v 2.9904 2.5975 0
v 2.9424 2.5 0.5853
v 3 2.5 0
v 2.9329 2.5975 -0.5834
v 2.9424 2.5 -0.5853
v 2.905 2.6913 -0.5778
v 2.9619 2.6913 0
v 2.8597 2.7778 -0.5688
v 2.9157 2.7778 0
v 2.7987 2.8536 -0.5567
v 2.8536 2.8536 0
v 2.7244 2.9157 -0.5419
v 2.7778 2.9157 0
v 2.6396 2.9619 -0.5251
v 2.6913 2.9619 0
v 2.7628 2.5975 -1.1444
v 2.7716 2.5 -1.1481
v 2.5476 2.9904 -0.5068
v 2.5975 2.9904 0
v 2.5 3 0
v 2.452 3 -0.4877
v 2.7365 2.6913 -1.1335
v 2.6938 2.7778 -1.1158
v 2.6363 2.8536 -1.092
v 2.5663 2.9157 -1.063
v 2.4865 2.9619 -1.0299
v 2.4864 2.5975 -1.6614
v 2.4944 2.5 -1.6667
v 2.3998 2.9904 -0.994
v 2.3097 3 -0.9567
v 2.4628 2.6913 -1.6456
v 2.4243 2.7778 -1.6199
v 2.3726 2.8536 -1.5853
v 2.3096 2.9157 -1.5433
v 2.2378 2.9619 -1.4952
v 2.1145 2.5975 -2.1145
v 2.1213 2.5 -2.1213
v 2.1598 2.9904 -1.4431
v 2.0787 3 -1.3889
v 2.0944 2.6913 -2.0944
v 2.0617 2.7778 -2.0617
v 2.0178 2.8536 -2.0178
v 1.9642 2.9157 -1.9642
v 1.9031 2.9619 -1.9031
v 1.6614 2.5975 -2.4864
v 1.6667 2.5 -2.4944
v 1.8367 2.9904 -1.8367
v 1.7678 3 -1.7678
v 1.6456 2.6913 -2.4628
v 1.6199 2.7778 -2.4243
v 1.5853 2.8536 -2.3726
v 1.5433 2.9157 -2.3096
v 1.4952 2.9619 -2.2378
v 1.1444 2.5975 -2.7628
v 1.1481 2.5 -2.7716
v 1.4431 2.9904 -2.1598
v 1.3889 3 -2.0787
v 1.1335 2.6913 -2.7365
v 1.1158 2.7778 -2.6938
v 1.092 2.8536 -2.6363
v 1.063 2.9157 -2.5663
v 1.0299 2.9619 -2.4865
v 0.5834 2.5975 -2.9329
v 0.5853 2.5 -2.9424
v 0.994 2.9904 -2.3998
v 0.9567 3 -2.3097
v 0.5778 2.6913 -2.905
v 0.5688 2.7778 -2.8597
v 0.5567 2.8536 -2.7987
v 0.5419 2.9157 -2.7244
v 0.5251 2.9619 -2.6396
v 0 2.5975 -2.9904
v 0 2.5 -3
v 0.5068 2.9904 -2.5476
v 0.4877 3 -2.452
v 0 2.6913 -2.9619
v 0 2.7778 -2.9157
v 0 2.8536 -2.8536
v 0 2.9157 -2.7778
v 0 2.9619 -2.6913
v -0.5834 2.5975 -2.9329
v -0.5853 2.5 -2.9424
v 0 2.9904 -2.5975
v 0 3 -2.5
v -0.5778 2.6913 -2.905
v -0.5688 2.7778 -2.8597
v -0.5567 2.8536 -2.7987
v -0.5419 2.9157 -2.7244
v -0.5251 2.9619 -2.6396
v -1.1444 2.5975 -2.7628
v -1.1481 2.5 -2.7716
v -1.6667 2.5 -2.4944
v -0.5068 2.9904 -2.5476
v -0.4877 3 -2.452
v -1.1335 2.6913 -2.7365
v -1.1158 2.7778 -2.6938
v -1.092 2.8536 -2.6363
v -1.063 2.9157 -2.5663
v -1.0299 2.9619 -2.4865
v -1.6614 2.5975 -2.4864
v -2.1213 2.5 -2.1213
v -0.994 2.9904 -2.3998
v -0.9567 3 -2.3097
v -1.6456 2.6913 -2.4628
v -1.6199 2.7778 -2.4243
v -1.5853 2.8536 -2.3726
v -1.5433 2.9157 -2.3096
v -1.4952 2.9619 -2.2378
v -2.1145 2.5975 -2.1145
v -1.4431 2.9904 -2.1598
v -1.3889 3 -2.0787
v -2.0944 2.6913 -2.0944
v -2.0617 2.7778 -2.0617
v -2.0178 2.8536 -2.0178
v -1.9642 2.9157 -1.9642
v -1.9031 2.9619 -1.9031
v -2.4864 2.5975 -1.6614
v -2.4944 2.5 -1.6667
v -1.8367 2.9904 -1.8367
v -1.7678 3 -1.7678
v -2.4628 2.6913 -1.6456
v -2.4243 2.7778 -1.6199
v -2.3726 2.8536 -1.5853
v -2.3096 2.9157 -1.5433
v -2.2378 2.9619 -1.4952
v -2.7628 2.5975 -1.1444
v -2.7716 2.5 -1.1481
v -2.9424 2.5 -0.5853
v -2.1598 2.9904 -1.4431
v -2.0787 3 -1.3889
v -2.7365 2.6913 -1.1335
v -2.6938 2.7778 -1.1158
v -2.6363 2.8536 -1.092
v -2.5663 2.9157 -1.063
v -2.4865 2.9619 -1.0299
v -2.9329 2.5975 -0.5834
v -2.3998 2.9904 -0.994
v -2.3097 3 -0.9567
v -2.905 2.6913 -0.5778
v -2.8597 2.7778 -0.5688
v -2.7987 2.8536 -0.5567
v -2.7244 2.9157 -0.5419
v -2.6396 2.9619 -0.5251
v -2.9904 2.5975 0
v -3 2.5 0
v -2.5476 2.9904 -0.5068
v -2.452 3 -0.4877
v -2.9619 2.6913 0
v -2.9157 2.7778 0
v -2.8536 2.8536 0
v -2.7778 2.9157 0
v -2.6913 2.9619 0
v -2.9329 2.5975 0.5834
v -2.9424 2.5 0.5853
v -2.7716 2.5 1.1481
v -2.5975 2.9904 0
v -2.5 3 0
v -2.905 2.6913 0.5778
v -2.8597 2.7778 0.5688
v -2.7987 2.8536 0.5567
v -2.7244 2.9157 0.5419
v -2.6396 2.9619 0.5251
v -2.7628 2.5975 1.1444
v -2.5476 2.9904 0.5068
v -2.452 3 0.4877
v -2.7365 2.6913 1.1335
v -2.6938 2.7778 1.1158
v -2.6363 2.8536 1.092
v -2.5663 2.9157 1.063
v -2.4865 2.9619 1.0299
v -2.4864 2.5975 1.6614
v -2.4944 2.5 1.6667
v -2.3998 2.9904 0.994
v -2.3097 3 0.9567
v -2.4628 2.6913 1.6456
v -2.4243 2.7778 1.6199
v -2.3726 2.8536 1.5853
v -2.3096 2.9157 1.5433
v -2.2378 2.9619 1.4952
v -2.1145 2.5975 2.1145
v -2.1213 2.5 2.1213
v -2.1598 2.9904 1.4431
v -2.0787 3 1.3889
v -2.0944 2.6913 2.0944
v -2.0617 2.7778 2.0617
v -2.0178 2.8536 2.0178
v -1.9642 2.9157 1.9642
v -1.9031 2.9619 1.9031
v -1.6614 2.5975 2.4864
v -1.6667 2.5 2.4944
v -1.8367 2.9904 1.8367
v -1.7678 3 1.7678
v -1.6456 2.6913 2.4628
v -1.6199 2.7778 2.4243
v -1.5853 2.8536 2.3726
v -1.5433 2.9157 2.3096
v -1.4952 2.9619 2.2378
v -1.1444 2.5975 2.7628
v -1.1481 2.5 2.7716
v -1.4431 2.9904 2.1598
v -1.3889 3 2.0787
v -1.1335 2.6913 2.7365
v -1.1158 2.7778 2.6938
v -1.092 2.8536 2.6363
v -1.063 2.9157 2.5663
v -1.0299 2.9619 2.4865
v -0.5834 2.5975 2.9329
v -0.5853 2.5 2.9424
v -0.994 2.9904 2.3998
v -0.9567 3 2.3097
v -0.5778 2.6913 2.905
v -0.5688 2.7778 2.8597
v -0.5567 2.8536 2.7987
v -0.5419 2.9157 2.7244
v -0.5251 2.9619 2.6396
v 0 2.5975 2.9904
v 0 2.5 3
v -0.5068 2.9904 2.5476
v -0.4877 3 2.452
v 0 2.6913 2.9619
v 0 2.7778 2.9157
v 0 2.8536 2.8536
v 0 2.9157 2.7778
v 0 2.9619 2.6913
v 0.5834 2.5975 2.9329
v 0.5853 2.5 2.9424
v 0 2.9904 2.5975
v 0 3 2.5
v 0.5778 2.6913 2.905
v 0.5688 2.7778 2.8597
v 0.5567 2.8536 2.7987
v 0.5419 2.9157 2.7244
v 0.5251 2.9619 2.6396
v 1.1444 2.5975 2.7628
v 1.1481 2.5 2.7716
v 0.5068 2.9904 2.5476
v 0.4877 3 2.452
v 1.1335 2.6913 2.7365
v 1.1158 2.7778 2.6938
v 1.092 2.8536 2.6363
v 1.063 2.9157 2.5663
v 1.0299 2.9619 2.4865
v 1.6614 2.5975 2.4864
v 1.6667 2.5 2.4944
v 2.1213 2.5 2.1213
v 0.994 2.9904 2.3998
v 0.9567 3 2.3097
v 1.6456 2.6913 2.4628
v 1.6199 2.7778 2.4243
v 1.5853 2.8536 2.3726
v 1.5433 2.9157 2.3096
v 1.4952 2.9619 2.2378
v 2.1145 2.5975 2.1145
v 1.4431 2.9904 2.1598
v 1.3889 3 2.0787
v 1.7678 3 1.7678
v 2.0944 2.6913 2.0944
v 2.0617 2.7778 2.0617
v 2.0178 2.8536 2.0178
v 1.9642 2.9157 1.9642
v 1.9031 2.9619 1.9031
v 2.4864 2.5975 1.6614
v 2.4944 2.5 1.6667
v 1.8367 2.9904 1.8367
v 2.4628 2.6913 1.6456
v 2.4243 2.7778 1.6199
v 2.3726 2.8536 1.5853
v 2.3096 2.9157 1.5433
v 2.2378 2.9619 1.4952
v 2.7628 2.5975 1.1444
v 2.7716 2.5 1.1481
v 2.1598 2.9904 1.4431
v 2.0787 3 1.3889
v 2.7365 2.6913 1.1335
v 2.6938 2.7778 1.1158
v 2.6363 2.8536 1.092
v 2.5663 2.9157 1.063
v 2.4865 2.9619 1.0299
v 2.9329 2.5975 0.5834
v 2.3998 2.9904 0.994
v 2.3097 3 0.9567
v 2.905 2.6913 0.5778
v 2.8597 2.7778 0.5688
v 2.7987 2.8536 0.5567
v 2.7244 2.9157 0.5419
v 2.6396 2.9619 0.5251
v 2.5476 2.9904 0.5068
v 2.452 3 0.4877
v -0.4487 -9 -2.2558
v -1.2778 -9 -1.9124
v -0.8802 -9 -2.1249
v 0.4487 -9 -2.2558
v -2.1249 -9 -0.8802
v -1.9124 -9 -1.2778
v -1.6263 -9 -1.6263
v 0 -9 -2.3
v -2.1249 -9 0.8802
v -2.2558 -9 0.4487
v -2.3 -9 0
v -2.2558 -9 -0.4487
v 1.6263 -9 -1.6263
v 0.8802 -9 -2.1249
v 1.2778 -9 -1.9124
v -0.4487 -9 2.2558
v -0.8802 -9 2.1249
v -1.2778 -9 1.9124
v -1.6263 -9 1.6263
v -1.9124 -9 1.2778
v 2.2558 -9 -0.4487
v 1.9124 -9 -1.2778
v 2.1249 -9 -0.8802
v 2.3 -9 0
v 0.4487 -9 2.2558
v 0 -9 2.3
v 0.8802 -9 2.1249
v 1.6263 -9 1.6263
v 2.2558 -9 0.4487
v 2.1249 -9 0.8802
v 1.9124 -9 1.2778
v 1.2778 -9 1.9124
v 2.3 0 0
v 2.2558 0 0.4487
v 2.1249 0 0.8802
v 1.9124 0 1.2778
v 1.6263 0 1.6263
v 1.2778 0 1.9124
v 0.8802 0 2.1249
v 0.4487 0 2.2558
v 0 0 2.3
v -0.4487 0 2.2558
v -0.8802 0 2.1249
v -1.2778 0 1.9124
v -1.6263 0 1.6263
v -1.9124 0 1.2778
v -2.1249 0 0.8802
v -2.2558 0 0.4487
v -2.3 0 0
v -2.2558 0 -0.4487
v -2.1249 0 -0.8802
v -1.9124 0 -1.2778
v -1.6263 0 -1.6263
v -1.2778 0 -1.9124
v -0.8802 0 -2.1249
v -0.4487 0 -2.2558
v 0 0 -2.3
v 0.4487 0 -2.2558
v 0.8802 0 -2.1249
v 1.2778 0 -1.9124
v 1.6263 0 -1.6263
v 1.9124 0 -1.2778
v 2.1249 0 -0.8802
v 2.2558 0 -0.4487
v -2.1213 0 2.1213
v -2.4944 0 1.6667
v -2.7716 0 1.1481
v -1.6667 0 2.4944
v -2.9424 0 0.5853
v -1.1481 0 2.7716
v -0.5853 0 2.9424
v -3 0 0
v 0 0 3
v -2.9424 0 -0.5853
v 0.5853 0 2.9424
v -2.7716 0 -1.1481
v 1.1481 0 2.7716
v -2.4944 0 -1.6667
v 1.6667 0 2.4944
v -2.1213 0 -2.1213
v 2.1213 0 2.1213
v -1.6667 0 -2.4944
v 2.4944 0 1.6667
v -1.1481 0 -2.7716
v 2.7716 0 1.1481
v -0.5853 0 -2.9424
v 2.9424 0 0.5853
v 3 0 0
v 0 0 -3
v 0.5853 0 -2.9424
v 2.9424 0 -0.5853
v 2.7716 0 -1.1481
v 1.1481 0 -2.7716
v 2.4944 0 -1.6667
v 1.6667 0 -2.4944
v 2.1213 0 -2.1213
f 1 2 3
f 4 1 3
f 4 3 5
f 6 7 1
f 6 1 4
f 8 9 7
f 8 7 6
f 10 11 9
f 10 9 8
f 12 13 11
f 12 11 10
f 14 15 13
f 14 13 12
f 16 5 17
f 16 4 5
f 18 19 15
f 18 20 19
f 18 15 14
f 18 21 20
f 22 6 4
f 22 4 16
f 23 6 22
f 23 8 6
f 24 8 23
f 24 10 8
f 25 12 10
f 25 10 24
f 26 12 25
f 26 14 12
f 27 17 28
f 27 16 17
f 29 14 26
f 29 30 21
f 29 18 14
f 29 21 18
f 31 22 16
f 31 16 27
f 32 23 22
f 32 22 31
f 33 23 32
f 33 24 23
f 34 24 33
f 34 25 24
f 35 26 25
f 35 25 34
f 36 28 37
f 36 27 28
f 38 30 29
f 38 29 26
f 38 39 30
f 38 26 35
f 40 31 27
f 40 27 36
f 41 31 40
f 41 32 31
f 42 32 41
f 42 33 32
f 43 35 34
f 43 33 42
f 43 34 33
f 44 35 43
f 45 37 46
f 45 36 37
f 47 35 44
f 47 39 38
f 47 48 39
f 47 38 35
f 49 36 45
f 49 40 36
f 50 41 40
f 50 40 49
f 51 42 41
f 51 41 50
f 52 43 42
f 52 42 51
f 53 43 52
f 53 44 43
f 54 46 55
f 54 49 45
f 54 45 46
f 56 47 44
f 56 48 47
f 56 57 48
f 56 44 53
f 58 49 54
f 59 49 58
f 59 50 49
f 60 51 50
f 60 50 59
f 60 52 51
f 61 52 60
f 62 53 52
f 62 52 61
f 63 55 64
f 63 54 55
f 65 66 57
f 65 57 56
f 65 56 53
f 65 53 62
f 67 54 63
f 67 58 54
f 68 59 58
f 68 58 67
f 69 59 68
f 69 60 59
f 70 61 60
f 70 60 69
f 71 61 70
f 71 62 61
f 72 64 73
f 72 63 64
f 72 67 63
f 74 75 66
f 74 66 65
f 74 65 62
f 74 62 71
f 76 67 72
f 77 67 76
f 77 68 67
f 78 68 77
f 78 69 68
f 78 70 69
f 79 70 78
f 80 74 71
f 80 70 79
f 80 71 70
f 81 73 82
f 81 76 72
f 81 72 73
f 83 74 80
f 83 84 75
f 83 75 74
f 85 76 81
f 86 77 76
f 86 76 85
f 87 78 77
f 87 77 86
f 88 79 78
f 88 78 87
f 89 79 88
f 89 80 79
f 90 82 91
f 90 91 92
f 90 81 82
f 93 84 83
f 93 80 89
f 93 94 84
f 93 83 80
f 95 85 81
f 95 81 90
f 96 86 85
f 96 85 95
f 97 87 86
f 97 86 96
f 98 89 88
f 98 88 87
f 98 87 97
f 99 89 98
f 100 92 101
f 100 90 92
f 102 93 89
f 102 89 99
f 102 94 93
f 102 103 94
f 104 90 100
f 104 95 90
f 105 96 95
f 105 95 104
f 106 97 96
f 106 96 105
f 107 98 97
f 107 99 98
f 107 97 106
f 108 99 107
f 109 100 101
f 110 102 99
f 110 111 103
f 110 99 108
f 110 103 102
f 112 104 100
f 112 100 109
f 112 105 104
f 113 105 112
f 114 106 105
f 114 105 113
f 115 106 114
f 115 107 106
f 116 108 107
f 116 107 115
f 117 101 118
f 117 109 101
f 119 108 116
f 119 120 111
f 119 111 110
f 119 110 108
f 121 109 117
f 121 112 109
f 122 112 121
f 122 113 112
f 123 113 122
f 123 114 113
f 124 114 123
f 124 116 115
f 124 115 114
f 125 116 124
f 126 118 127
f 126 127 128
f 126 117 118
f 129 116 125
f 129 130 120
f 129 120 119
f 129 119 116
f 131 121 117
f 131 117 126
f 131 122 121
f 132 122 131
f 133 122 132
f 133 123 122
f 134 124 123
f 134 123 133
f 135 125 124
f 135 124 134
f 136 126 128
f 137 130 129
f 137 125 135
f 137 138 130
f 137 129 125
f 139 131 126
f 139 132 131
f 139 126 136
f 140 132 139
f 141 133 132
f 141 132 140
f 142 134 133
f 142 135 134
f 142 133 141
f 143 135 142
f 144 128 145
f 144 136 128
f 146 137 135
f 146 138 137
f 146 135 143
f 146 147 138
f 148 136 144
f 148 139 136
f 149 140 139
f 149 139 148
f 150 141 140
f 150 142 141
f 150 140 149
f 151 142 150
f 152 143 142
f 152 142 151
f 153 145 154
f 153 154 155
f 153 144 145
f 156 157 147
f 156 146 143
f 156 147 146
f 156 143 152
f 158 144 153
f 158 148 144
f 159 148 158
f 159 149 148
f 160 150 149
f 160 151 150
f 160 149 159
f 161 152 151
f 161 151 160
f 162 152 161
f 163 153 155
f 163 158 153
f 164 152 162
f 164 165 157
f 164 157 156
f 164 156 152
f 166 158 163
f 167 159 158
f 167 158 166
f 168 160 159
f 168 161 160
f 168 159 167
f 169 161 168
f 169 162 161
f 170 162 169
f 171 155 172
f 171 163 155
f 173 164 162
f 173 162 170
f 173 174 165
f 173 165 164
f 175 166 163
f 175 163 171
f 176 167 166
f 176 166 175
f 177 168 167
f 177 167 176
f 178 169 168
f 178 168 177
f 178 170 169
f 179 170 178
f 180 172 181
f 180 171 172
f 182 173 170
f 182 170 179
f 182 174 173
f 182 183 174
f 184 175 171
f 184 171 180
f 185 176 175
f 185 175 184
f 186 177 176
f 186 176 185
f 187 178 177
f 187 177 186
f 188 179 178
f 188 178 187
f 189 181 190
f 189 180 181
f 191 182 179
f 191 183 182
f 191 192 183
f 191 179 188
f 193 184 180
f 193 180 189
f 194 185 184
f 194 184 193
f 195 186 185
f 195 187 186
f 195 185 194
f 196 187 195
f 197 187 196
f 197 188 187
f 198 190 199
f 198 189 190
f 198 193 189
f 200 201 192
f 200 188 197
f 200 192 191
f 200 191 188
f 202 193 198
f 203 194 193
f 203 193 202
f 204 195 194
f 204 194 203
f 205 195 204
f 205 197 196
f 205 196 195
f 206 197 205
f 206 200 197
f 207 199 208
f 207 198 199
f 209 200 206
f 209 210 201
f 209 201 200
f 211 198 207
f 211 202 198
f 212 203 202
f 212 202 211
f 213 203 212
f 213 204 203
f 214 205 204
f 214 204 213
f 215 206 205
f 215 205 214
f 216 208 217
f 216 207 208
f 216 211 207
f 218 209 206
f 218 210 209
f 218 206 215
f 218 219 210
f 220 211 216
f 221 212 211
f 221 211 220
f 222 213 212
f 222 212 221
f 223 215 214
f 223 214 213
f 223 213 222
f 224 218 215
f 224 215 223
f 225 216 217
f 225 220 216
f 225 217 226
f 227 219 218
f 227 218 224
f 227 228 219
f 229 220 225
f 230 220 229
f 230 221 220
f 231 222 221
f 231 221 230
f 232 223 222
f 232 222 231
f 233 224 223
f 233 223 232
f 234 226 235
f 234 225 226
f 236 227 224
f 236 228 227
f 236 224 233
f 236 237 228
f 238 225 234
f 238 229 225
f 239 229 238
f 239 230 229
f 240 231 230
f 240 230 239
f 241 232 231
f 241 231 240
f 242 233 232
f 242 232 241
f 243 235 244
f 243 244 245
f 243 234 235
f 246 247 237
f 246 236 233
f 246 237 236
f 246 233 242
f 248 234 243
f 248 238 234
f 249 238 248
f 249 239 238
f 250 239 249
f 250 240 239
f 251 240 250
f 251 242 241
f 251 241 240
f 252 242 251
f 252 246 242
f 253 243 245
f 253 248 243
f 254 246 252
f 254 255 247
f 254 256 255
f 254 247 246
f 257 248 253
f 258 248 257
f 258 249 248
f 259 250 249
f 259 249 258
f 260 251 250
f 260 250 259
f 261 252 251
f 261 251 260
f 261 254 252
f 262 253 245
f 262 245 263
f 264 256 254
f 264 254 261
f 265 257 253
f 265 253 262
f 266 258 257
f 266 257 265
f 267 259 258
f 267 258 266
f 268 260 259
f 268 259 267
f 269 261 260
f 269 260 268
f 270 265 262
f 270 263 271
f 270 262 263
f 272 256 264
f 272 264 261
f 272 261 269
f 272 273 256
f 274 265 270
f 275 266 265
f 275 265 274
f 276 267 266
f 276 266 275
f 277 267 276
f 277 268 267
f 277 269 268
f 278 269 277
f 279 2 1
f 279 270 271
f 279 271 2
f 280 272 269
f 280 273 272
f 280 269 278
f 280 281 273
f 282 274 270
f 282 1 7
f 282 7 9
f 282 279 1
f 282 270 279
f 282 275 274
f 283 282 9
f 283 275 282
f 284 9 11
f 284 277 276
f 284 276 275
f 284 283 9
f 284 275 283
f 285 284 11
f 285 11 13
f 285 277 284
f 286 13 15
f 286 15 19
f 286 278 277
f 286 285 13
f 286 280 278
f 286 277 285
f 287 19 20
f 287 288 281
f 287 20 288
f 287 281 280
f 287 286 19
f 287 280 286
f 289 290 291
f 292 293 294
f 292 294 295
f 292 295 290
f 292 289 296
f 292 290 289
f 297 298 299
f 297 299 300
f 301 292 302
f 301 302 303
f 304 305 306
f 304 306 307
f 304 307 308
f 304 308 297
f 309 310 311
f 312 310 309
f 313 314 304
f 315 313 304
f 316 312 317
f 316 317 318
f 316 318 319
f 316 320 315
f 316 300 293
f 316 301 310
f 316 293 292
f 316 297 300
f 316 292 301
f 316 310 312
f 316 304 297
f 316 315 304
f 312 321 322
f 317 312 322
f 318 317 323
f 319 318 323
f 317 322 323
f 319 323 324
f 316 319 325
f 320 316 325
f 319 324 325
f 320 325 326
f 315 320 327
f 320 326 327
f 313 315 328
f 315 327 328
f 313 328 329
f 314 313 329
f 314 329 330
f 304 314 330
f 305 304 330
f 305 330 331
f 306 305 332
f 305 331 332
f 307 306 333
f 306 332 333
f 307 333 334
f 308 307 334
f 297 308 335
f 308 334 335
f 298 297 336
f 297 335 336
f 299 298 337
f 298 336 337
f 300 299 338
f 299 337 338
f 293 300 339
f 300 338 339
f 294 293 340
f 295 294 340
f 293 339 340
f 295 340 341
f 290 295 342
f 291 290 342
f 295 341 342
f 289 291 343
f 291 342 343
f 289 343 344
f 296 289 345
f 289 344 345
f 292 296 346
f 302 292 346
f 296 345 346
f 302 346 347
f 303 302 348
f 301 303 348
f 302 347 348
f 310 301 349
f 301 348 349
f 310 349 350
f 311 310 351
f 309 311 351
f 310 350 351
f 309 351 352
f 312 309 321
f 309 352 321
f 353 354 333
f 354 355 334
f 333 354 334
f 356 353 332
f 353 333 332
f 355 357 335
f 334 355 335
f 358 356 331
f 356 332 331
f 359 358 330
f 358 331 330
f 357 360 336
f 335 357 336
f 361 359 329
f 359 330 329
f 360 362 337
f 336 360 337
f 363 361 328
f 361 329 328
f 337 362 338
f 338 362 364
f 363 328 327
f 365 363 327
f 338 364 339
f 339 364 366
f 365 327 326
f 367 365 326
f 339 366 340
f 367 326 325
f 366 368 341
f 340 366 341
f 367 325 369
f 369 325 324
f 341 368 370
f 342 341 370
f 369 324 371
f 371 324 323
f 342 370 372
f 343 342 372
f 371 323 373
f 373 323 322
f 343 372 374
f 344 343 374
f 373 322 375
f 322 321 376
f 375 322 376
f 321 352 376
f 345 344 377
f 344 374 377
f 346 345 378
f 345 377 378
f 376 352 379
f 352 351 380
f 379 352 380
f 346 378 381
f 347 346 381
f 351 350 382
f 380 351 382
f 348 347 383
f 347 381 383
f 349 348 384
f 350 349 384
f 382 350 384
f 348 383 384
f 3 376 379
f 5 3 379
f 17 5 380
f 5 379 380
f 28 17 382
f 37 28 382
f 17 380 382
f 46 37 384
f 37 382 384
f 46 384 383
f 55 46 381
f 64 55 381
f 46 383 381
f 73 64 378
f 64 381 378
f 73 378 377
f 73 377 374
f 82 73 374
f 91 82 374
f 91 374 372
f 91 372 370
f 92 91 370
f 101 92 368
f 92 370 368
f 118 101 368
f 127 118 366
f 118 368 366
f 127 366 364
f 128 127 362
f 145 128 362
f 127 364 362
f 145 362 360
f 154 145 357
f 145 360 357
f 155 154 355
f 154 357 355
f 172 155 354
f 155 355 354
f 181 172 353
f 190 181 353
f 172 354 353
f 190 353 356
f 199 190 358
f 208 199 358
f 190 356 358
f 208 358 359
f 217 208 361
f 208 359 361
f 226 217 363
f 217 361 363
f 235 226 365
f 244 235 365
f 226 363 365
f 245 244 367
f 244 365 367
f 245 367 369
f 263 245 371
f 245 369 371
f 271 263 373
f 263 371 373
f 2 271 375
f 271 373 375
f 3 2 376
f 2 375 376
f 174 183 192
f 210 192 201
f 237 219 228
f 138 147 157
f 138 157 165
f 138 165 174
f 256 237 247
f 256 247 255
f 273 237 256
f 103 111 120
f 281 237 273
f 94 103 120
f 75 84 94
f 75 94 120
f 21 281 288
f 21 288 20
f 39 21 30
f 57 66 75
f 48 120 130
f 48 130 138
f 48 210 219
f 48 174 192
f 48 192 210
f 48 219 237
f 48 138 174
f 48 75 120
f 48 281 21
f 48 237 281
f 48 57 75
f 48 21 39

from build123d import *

# Parameters (mm, degrees)
SKETCH1_R           = 3
BOSS_EXTRUDE1_DEPTH = 3
FILLET1_R           = 0.5
SKETCH2_R           = 2.3
BOSS_EXTRUDE2_DEPTH = 9


with BuildPart() as part:
    # Sketch1 → Boss-Extrude1 (new body)
    with BuildSketch(Plane(origin=(0, 0, 0), x_dir=(1, 0, 0), z_dir=(0, 1, 0))):
        Circle(SKETCH1_R)
    extrude(amount=BOSS_EXTRUDE1_DEPTH)

    # Fillet1
    fillet1_edges = [part.edges().sort_by_distance(p)[0] for p in [
        (-3, 3, 0),
    ]]
    fillet(fillet1_edges, radius=FILLET1_R)

    # Sketch2 → Boss-Extrude2 (add)
    with BuildSketch(Plane.XZ):
        Circle(SKETCH2_R)
    extrude(amount=BOSS_EXTRUDE2_DEPTH)


solid = part.part
